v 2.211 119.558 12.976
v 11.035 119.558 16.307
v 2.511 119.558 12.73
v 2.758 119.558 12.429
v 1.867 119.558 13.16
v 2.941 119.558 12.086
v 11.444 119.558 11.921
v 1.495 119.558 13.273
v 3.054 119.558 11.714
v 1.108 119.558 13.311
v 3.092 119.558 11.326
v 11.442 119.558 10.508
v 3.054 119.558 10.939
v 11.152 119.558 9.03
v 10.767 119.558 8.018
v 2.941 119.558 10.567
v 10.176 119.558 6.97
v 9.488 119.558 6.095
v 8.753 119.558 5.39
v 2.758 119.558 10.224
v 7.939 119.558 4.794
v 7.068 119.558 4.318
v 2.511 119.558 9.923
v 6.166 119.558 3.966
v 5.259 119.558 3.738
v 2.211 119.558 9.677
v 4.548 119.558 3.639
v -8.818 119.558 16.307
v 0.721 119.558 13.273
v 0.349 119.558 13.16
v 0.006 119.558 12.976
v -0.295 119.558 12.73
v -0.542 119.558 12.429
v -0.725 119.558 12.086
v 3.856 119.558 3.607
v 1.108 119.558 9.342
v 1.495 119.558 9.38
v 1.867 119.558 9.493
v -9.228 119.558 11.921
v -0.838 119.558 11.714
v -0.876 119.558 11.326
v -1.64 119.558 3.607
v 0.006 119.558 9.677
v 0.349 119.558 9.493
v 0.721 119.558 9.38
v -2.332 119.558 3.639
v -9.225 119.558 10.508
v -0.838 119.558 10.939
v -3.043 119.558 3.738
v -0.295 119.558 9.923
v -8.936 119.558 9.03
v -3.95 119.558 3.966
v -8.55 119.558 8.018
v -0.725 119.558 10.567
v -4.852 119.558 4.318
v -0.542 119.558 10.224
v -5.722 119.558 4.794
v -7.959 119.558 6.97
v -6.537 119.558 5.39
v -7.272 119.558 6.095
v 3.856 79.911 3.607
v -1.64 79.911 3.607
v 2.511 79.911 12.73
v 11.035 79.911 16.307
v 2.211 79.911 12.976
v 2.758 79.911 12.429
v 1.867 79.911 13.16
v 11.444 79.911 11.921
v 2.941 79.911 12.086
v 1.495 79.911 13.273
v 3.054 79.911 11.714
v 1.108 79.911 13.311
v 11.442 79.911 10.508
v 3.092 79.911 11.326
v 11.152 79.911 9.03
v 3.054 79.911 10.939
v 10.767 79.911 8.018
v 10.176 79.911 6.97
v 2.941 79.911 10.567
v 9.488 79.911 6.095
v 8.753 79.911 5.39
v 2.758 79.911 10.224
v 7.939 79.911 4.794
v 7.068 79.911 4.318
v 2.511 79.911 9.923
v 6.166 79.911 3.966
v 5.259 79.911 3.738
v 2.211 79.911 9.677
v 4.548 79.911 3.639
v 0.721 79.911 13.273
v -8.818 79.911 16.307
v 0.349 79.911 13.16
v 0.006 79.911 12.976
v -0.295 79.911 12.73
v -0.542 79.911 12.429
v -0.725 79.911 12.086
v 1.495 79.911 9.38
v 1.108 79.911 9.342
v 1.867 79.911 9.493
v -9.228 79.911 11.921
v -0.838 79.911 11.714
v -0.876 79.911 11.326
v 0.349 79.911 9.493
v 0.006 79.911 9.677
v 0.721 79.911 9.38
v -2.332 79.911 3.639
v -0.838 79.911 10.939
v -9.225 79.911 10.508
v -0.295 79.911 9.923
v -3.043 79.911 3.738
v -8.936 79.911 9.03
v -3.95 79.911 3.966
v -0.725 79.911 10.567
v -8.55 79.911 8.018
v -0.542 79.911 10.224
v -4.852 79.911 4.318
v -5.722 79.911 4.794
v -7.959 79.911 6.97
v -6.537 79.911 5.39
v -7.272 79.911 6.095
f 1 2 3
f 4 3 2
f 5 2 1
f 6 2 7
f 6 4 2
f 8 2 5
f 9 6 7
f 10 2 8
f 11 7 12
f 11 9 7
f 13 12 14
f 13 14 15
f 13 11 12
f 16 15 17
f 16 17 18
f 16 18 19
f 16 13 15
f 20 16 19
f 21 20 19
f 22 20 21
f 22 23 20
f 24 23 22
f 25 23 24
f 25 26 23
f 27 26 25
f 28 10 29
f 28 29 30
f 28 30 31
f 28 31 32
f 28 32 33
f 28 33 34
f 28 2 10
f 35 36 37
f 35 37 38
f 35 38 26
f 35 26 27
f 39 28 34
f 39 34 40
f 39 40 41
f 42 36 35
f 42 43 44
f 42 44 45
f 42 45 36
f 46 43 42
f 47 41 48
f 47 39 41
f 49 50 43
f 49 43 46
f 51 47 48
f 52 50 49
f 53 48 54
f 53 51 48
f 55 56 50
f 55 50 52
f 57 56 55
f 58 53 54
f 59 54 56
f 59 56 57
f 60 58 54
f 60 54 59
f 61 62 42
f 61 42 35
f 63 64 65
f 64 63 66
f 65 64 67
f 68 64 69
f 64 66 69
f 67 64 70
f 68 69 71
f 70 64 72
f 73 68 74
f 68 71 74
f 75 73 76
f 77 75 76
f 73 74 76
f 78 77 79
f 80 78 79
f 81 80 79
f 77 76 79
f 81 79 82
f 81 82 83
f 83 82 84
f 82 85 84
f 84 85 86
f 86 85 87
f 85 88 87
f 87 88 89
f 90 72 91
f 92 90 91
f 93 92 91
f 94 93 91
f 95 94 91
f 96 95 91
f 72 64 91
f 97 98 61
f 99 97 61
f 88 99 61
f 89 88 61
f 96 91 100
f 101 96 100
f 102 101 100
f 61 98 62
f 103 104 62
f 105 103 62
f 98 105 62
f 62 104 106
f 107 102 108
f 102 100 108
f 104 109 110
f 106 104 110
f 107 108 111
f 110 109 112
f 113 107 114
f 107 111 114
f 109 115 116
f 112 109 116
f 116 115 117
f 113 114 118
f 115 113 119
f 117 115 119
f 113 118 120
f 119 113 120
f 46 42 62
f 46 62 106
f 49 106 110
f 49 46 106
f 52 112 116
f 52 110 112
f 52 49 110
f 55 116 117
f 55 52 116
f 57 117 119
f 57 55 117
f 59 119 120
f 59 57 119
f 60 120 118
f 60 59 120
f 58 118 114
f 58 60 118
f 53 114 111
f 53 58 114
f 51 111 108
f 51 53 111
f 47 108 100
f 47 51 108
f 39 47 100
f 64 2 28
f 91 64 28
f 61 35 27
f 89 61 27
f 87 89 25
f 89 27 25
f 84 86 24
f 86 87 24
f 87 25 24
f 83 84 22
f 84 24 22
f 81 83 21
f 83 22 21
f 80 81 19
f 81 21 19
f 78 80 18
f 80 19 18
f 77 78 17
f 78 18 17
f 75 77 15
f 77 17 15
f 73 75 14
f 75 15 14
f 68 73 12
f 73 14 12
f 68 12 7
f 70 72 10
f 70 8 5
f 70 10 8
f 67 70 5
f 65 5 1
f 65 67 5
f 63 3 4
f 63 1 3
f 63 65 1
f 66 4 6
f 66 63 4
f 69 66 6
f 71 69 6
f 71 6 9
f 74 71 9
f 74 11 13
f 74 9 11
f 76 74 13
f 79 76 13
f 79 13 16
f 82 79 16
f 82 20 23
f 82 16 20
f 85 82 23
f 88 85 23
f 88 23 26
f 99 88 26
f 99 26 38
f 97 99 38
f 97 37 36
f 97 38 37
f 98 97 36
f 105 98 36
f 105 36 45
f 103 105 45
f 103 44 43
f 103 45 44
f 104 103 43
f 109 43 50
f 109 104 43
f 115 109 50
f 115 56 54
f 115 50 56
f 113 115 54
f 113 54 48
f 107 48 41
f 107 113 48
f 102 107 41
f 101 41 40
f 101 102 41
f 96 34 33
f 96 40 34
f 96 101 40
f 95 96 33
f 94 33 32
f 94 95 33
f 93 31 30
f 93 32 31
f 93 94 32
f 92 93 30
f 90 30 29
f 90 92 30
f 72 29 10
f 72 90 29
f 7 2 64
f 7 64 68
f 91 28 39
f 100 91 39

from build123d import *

# Parameters (mm, degrees)
SKETCH1_R               = 1.984375
BOSS_EXTRUDE1_DEPTH     = 169.87265999999997
CUT_EXTRUDE1_DEPTH      = 23.05812
CUT_EXTRUDE2_START      = -169.87266
CUT_EXTRUDE2_DEPTH      = 23.05812
FILLET1_R               = 7.62
CUT_EXTRUDE3_DEPTH      = 198.3909425992125
CUT_EXTRUDE3_DEPTH_BACK = 198.3909425992125
SKETCH6_R               = 2.100000000000005
SKETCH6_R_2             = 2.0999999999999983
CUT_EXTRUDE4_DEPTH      = 198.3909425992125
CUT_EXTRUDE4_DEPTH_BACK = 198.3909425992125
SKETCH7_W               = 96.26632678346117
SKETCH7_H               = 79.91099312056471
SKETCH7_H_2             = 50.31480687943524
CUT_EXTRUDE5_DEPTH      = 109.06635501646407
CUT_EXTRUDE5_DEPTH_BACK = 109.06635501646407


with BuildPart() as part:
    # Sketch1 → Boss-Extrude1 (new body)
    with BuildSketch(Plane(origin=(0, 0, 0), x_dir=(1, 0, 0), z_dir=(0, 1, 0))):
        with BuildLine():
            Line((-9.955287346489113, -3.6074515728352274), (-6.769721367669625, -3.607451572835229))
            Line((-6.769721367669625, -3.607451572835229), (8.985913588520251, -3.607451572835254))
            Line((8.985913588520251, -3.607451572835254), (12.171479567676489, -3.6074515728352536))
            add(Edge.make_bspline(
                [(10.60289964969583, -20.752451572835255), (11.099968974105767, -15.73020157118813), (11.63056361676113, -10.016003165571346), (12.11399787104698, -4.2968169522780775), (12.171479567676489, -3.6074515728352536)],
                knots=[0.38496962590391054, 0.38496962590391054, 0.38496962590391054, 0.38496962590391054, 0.4581086713676085, 0.468131593311824, 0.468131593311824, 0.468131593311824, 0.468131593311824], degree=3))
            add(Edge.make_bspline(
                [(1.1080961105936413, -99.87377835629641), (4.527344743513008, -73.5317641629186), (7.98655990047842, -47.187219651543), (10.60289964969583, -20.752451572835255)],
                knots=[0, 0, 0, 0, 0.38496962590391054, 0.38496962590391054, 0.38496962590391054, 0.38496962590391054], degree=3))
            add(Edge.make_bspline(
                [(1.1080961105936413, -99.87377835629641), (-2.311152522316452, -73.53176416292023), (-5.77036767929202, -47.18721965154205), (-8.386707428509173, -20.752451572835213)],
                knots=[0, 0, 0, 0, 0.3849696259039116, 0.3849696259039116, 0.3849696259039116, 0.3849696259039116], degree=3))
            add(Edge.make_bspline(
                [(-8.386707428509173, -20.752451572835213), (-8.88377675291906, -15.730201571188243), (-9.414371395575625, -10.016003165551679), (-9.897805649859514, -4.29681695227938), (-9.955287346489113, -3.6074515728352274)],
                knots=[0.3849696259039116, 0.3849696259039116, 0.3849696259039116, 0.3849696259039116, 0.4581086713676079, 0.46813159331185, 0.46813159331185, 0.46813159331185, 0.46813159331185], degree=3))
        make_face()
        with Locations(Location((1.10810856874065, -11.326456678177, 0), (0, 0, 270))):
            Circle(SKETCH1_R, mode=Mode.SUBTRACT)
    extrude(amount=BOSS_EXTRUDE1_DEPTH)

    # Sketch2 → Cut-Extrude1 (cut)
    with BuildSketch(Plane(origin=(0, 169.87265999999997, 0), x_dir=(1, 0, 0), z_dir=(0, 1, 0))):
        Polygon((-9.955287346489113, -3.6074515728352274), (25.808519749497883, -3.6074515728352274), (25.808519749497883, -26.312456678177), (-9.95528734648911, -26.312456678177), align=None)
    extrude(amount=-CUT_EXTRUDE1_DEPTH, mode=Mode.SUBTRACT)

    # Sketch2<2> → Cut-Extrude2 (cut)
    with BuildSketch(Plane(origin=(0, 169.87265999999997, 0), x_dir=(1, 0, 0), z_dir=(0, 1, 0)).offset(CUT_EXTRUDE2_START)):
        Polygon((-9.955287346489113, -3.6074515728352274), (25.808519749497883, -3.6074515728352274), (25.808519749497883, -26.312456678177), (-9.95528734648911, -26.312456678177), align=None)
    extrude(amount=CUT_EXTRUDE2_DEPTH, mode=Mode.SUBTRACT)

    # Fillet1
    fillet1_edges = [part.edges().sort_by_distance(p)[0] for p in [
        (-7.8241553741226255, 11.529059999999971, 26.312456678177),
        (10.04034759530939, 11.529059999999971, 26.312456678177),
        (-9.955287346489113, 84.93632999999997, 3.6074515728352274),
        (12.171479567676489, 84.93632999999997, 3.6074515728352536),
        (-7.8241553741226255, 158.34359999999998, 26.312456678177),
        (10.04034759530939, 158.34359999999998, 26.312456678177),
    ]]
    fillet(fillet1_edges, radius=FILLET1_R)

    # Sketch6 → Cut-Extrude3 (cut, two sides: drawn at the far end of the back side and taken through both)
    with BuildSketch(Plane.XZ.offset(-CUT_EXTRUDE3_DEPTH_BACK)):
        with Locations(Location((1.1080961105936413, 71.9337783562964, 0), (0, 0, 270))):
            Circle(SKETCH6_R)
        with Locations(Location((1.1080961105935272, 34.76055213743882, 0), (0, 0, 270))):
            Circle(SKETCH6_R_2)
    extrude(amount=CUT_EXTRUDE3_DEPTH + CUT_EXTRUDE3_DEPTH_BACK, mode=Mode.SUBTRACT)

    # Sketch7 → Cut-Extrude4 (cut, two sides: drawn at the far end of the back side and taken through both)
    with BuildSketch(Plane(origin=(0, 0, 0), x_dir=(0, 0, -1), z_dir=(1, 0, 0)).offset(-CUT_EXTRUDE4_DEPTH_BACK)):
        with Locations((-51.740614964565815, 39.955496560282356)):
            Rectangle(SKETCH7_W, SKETCH7_H)
        with Locations((-51.740614964565815, 144.71525656028234)):
            Rectangle(SKETCH7_W, SKETCH7_H_2)
    extrude(amount=CUT_EXTRUDE4_DEPTH + CUT_EXTRUDE4_DEPTH_BACK, mode=Mode.SUBTRACT)

    # Sketch8 → Cut-Extrude5 (cut, two sides: drawn at the far end of the back side and taken through both)
    with BuildSketch(Plane.XZ.offset(-79.91099312056471).offset(-CUT_EXTRUDE5_DEPTH_BACK)):
        Polygon((-35.738182727497644, 136.6065064389988), (32.4461710118659, 136.6065064389988), (32.446171011865914, 16.307451572835227), (-35.73818272749763, 16.307451572835227), align=None)
    extrude(amount=CUT_EXTRUDE5_DEPTH + CUT_EXTRUDE5_DEPTH_BACK, mode=Mode.SUBTRACT)


solid = part.part
